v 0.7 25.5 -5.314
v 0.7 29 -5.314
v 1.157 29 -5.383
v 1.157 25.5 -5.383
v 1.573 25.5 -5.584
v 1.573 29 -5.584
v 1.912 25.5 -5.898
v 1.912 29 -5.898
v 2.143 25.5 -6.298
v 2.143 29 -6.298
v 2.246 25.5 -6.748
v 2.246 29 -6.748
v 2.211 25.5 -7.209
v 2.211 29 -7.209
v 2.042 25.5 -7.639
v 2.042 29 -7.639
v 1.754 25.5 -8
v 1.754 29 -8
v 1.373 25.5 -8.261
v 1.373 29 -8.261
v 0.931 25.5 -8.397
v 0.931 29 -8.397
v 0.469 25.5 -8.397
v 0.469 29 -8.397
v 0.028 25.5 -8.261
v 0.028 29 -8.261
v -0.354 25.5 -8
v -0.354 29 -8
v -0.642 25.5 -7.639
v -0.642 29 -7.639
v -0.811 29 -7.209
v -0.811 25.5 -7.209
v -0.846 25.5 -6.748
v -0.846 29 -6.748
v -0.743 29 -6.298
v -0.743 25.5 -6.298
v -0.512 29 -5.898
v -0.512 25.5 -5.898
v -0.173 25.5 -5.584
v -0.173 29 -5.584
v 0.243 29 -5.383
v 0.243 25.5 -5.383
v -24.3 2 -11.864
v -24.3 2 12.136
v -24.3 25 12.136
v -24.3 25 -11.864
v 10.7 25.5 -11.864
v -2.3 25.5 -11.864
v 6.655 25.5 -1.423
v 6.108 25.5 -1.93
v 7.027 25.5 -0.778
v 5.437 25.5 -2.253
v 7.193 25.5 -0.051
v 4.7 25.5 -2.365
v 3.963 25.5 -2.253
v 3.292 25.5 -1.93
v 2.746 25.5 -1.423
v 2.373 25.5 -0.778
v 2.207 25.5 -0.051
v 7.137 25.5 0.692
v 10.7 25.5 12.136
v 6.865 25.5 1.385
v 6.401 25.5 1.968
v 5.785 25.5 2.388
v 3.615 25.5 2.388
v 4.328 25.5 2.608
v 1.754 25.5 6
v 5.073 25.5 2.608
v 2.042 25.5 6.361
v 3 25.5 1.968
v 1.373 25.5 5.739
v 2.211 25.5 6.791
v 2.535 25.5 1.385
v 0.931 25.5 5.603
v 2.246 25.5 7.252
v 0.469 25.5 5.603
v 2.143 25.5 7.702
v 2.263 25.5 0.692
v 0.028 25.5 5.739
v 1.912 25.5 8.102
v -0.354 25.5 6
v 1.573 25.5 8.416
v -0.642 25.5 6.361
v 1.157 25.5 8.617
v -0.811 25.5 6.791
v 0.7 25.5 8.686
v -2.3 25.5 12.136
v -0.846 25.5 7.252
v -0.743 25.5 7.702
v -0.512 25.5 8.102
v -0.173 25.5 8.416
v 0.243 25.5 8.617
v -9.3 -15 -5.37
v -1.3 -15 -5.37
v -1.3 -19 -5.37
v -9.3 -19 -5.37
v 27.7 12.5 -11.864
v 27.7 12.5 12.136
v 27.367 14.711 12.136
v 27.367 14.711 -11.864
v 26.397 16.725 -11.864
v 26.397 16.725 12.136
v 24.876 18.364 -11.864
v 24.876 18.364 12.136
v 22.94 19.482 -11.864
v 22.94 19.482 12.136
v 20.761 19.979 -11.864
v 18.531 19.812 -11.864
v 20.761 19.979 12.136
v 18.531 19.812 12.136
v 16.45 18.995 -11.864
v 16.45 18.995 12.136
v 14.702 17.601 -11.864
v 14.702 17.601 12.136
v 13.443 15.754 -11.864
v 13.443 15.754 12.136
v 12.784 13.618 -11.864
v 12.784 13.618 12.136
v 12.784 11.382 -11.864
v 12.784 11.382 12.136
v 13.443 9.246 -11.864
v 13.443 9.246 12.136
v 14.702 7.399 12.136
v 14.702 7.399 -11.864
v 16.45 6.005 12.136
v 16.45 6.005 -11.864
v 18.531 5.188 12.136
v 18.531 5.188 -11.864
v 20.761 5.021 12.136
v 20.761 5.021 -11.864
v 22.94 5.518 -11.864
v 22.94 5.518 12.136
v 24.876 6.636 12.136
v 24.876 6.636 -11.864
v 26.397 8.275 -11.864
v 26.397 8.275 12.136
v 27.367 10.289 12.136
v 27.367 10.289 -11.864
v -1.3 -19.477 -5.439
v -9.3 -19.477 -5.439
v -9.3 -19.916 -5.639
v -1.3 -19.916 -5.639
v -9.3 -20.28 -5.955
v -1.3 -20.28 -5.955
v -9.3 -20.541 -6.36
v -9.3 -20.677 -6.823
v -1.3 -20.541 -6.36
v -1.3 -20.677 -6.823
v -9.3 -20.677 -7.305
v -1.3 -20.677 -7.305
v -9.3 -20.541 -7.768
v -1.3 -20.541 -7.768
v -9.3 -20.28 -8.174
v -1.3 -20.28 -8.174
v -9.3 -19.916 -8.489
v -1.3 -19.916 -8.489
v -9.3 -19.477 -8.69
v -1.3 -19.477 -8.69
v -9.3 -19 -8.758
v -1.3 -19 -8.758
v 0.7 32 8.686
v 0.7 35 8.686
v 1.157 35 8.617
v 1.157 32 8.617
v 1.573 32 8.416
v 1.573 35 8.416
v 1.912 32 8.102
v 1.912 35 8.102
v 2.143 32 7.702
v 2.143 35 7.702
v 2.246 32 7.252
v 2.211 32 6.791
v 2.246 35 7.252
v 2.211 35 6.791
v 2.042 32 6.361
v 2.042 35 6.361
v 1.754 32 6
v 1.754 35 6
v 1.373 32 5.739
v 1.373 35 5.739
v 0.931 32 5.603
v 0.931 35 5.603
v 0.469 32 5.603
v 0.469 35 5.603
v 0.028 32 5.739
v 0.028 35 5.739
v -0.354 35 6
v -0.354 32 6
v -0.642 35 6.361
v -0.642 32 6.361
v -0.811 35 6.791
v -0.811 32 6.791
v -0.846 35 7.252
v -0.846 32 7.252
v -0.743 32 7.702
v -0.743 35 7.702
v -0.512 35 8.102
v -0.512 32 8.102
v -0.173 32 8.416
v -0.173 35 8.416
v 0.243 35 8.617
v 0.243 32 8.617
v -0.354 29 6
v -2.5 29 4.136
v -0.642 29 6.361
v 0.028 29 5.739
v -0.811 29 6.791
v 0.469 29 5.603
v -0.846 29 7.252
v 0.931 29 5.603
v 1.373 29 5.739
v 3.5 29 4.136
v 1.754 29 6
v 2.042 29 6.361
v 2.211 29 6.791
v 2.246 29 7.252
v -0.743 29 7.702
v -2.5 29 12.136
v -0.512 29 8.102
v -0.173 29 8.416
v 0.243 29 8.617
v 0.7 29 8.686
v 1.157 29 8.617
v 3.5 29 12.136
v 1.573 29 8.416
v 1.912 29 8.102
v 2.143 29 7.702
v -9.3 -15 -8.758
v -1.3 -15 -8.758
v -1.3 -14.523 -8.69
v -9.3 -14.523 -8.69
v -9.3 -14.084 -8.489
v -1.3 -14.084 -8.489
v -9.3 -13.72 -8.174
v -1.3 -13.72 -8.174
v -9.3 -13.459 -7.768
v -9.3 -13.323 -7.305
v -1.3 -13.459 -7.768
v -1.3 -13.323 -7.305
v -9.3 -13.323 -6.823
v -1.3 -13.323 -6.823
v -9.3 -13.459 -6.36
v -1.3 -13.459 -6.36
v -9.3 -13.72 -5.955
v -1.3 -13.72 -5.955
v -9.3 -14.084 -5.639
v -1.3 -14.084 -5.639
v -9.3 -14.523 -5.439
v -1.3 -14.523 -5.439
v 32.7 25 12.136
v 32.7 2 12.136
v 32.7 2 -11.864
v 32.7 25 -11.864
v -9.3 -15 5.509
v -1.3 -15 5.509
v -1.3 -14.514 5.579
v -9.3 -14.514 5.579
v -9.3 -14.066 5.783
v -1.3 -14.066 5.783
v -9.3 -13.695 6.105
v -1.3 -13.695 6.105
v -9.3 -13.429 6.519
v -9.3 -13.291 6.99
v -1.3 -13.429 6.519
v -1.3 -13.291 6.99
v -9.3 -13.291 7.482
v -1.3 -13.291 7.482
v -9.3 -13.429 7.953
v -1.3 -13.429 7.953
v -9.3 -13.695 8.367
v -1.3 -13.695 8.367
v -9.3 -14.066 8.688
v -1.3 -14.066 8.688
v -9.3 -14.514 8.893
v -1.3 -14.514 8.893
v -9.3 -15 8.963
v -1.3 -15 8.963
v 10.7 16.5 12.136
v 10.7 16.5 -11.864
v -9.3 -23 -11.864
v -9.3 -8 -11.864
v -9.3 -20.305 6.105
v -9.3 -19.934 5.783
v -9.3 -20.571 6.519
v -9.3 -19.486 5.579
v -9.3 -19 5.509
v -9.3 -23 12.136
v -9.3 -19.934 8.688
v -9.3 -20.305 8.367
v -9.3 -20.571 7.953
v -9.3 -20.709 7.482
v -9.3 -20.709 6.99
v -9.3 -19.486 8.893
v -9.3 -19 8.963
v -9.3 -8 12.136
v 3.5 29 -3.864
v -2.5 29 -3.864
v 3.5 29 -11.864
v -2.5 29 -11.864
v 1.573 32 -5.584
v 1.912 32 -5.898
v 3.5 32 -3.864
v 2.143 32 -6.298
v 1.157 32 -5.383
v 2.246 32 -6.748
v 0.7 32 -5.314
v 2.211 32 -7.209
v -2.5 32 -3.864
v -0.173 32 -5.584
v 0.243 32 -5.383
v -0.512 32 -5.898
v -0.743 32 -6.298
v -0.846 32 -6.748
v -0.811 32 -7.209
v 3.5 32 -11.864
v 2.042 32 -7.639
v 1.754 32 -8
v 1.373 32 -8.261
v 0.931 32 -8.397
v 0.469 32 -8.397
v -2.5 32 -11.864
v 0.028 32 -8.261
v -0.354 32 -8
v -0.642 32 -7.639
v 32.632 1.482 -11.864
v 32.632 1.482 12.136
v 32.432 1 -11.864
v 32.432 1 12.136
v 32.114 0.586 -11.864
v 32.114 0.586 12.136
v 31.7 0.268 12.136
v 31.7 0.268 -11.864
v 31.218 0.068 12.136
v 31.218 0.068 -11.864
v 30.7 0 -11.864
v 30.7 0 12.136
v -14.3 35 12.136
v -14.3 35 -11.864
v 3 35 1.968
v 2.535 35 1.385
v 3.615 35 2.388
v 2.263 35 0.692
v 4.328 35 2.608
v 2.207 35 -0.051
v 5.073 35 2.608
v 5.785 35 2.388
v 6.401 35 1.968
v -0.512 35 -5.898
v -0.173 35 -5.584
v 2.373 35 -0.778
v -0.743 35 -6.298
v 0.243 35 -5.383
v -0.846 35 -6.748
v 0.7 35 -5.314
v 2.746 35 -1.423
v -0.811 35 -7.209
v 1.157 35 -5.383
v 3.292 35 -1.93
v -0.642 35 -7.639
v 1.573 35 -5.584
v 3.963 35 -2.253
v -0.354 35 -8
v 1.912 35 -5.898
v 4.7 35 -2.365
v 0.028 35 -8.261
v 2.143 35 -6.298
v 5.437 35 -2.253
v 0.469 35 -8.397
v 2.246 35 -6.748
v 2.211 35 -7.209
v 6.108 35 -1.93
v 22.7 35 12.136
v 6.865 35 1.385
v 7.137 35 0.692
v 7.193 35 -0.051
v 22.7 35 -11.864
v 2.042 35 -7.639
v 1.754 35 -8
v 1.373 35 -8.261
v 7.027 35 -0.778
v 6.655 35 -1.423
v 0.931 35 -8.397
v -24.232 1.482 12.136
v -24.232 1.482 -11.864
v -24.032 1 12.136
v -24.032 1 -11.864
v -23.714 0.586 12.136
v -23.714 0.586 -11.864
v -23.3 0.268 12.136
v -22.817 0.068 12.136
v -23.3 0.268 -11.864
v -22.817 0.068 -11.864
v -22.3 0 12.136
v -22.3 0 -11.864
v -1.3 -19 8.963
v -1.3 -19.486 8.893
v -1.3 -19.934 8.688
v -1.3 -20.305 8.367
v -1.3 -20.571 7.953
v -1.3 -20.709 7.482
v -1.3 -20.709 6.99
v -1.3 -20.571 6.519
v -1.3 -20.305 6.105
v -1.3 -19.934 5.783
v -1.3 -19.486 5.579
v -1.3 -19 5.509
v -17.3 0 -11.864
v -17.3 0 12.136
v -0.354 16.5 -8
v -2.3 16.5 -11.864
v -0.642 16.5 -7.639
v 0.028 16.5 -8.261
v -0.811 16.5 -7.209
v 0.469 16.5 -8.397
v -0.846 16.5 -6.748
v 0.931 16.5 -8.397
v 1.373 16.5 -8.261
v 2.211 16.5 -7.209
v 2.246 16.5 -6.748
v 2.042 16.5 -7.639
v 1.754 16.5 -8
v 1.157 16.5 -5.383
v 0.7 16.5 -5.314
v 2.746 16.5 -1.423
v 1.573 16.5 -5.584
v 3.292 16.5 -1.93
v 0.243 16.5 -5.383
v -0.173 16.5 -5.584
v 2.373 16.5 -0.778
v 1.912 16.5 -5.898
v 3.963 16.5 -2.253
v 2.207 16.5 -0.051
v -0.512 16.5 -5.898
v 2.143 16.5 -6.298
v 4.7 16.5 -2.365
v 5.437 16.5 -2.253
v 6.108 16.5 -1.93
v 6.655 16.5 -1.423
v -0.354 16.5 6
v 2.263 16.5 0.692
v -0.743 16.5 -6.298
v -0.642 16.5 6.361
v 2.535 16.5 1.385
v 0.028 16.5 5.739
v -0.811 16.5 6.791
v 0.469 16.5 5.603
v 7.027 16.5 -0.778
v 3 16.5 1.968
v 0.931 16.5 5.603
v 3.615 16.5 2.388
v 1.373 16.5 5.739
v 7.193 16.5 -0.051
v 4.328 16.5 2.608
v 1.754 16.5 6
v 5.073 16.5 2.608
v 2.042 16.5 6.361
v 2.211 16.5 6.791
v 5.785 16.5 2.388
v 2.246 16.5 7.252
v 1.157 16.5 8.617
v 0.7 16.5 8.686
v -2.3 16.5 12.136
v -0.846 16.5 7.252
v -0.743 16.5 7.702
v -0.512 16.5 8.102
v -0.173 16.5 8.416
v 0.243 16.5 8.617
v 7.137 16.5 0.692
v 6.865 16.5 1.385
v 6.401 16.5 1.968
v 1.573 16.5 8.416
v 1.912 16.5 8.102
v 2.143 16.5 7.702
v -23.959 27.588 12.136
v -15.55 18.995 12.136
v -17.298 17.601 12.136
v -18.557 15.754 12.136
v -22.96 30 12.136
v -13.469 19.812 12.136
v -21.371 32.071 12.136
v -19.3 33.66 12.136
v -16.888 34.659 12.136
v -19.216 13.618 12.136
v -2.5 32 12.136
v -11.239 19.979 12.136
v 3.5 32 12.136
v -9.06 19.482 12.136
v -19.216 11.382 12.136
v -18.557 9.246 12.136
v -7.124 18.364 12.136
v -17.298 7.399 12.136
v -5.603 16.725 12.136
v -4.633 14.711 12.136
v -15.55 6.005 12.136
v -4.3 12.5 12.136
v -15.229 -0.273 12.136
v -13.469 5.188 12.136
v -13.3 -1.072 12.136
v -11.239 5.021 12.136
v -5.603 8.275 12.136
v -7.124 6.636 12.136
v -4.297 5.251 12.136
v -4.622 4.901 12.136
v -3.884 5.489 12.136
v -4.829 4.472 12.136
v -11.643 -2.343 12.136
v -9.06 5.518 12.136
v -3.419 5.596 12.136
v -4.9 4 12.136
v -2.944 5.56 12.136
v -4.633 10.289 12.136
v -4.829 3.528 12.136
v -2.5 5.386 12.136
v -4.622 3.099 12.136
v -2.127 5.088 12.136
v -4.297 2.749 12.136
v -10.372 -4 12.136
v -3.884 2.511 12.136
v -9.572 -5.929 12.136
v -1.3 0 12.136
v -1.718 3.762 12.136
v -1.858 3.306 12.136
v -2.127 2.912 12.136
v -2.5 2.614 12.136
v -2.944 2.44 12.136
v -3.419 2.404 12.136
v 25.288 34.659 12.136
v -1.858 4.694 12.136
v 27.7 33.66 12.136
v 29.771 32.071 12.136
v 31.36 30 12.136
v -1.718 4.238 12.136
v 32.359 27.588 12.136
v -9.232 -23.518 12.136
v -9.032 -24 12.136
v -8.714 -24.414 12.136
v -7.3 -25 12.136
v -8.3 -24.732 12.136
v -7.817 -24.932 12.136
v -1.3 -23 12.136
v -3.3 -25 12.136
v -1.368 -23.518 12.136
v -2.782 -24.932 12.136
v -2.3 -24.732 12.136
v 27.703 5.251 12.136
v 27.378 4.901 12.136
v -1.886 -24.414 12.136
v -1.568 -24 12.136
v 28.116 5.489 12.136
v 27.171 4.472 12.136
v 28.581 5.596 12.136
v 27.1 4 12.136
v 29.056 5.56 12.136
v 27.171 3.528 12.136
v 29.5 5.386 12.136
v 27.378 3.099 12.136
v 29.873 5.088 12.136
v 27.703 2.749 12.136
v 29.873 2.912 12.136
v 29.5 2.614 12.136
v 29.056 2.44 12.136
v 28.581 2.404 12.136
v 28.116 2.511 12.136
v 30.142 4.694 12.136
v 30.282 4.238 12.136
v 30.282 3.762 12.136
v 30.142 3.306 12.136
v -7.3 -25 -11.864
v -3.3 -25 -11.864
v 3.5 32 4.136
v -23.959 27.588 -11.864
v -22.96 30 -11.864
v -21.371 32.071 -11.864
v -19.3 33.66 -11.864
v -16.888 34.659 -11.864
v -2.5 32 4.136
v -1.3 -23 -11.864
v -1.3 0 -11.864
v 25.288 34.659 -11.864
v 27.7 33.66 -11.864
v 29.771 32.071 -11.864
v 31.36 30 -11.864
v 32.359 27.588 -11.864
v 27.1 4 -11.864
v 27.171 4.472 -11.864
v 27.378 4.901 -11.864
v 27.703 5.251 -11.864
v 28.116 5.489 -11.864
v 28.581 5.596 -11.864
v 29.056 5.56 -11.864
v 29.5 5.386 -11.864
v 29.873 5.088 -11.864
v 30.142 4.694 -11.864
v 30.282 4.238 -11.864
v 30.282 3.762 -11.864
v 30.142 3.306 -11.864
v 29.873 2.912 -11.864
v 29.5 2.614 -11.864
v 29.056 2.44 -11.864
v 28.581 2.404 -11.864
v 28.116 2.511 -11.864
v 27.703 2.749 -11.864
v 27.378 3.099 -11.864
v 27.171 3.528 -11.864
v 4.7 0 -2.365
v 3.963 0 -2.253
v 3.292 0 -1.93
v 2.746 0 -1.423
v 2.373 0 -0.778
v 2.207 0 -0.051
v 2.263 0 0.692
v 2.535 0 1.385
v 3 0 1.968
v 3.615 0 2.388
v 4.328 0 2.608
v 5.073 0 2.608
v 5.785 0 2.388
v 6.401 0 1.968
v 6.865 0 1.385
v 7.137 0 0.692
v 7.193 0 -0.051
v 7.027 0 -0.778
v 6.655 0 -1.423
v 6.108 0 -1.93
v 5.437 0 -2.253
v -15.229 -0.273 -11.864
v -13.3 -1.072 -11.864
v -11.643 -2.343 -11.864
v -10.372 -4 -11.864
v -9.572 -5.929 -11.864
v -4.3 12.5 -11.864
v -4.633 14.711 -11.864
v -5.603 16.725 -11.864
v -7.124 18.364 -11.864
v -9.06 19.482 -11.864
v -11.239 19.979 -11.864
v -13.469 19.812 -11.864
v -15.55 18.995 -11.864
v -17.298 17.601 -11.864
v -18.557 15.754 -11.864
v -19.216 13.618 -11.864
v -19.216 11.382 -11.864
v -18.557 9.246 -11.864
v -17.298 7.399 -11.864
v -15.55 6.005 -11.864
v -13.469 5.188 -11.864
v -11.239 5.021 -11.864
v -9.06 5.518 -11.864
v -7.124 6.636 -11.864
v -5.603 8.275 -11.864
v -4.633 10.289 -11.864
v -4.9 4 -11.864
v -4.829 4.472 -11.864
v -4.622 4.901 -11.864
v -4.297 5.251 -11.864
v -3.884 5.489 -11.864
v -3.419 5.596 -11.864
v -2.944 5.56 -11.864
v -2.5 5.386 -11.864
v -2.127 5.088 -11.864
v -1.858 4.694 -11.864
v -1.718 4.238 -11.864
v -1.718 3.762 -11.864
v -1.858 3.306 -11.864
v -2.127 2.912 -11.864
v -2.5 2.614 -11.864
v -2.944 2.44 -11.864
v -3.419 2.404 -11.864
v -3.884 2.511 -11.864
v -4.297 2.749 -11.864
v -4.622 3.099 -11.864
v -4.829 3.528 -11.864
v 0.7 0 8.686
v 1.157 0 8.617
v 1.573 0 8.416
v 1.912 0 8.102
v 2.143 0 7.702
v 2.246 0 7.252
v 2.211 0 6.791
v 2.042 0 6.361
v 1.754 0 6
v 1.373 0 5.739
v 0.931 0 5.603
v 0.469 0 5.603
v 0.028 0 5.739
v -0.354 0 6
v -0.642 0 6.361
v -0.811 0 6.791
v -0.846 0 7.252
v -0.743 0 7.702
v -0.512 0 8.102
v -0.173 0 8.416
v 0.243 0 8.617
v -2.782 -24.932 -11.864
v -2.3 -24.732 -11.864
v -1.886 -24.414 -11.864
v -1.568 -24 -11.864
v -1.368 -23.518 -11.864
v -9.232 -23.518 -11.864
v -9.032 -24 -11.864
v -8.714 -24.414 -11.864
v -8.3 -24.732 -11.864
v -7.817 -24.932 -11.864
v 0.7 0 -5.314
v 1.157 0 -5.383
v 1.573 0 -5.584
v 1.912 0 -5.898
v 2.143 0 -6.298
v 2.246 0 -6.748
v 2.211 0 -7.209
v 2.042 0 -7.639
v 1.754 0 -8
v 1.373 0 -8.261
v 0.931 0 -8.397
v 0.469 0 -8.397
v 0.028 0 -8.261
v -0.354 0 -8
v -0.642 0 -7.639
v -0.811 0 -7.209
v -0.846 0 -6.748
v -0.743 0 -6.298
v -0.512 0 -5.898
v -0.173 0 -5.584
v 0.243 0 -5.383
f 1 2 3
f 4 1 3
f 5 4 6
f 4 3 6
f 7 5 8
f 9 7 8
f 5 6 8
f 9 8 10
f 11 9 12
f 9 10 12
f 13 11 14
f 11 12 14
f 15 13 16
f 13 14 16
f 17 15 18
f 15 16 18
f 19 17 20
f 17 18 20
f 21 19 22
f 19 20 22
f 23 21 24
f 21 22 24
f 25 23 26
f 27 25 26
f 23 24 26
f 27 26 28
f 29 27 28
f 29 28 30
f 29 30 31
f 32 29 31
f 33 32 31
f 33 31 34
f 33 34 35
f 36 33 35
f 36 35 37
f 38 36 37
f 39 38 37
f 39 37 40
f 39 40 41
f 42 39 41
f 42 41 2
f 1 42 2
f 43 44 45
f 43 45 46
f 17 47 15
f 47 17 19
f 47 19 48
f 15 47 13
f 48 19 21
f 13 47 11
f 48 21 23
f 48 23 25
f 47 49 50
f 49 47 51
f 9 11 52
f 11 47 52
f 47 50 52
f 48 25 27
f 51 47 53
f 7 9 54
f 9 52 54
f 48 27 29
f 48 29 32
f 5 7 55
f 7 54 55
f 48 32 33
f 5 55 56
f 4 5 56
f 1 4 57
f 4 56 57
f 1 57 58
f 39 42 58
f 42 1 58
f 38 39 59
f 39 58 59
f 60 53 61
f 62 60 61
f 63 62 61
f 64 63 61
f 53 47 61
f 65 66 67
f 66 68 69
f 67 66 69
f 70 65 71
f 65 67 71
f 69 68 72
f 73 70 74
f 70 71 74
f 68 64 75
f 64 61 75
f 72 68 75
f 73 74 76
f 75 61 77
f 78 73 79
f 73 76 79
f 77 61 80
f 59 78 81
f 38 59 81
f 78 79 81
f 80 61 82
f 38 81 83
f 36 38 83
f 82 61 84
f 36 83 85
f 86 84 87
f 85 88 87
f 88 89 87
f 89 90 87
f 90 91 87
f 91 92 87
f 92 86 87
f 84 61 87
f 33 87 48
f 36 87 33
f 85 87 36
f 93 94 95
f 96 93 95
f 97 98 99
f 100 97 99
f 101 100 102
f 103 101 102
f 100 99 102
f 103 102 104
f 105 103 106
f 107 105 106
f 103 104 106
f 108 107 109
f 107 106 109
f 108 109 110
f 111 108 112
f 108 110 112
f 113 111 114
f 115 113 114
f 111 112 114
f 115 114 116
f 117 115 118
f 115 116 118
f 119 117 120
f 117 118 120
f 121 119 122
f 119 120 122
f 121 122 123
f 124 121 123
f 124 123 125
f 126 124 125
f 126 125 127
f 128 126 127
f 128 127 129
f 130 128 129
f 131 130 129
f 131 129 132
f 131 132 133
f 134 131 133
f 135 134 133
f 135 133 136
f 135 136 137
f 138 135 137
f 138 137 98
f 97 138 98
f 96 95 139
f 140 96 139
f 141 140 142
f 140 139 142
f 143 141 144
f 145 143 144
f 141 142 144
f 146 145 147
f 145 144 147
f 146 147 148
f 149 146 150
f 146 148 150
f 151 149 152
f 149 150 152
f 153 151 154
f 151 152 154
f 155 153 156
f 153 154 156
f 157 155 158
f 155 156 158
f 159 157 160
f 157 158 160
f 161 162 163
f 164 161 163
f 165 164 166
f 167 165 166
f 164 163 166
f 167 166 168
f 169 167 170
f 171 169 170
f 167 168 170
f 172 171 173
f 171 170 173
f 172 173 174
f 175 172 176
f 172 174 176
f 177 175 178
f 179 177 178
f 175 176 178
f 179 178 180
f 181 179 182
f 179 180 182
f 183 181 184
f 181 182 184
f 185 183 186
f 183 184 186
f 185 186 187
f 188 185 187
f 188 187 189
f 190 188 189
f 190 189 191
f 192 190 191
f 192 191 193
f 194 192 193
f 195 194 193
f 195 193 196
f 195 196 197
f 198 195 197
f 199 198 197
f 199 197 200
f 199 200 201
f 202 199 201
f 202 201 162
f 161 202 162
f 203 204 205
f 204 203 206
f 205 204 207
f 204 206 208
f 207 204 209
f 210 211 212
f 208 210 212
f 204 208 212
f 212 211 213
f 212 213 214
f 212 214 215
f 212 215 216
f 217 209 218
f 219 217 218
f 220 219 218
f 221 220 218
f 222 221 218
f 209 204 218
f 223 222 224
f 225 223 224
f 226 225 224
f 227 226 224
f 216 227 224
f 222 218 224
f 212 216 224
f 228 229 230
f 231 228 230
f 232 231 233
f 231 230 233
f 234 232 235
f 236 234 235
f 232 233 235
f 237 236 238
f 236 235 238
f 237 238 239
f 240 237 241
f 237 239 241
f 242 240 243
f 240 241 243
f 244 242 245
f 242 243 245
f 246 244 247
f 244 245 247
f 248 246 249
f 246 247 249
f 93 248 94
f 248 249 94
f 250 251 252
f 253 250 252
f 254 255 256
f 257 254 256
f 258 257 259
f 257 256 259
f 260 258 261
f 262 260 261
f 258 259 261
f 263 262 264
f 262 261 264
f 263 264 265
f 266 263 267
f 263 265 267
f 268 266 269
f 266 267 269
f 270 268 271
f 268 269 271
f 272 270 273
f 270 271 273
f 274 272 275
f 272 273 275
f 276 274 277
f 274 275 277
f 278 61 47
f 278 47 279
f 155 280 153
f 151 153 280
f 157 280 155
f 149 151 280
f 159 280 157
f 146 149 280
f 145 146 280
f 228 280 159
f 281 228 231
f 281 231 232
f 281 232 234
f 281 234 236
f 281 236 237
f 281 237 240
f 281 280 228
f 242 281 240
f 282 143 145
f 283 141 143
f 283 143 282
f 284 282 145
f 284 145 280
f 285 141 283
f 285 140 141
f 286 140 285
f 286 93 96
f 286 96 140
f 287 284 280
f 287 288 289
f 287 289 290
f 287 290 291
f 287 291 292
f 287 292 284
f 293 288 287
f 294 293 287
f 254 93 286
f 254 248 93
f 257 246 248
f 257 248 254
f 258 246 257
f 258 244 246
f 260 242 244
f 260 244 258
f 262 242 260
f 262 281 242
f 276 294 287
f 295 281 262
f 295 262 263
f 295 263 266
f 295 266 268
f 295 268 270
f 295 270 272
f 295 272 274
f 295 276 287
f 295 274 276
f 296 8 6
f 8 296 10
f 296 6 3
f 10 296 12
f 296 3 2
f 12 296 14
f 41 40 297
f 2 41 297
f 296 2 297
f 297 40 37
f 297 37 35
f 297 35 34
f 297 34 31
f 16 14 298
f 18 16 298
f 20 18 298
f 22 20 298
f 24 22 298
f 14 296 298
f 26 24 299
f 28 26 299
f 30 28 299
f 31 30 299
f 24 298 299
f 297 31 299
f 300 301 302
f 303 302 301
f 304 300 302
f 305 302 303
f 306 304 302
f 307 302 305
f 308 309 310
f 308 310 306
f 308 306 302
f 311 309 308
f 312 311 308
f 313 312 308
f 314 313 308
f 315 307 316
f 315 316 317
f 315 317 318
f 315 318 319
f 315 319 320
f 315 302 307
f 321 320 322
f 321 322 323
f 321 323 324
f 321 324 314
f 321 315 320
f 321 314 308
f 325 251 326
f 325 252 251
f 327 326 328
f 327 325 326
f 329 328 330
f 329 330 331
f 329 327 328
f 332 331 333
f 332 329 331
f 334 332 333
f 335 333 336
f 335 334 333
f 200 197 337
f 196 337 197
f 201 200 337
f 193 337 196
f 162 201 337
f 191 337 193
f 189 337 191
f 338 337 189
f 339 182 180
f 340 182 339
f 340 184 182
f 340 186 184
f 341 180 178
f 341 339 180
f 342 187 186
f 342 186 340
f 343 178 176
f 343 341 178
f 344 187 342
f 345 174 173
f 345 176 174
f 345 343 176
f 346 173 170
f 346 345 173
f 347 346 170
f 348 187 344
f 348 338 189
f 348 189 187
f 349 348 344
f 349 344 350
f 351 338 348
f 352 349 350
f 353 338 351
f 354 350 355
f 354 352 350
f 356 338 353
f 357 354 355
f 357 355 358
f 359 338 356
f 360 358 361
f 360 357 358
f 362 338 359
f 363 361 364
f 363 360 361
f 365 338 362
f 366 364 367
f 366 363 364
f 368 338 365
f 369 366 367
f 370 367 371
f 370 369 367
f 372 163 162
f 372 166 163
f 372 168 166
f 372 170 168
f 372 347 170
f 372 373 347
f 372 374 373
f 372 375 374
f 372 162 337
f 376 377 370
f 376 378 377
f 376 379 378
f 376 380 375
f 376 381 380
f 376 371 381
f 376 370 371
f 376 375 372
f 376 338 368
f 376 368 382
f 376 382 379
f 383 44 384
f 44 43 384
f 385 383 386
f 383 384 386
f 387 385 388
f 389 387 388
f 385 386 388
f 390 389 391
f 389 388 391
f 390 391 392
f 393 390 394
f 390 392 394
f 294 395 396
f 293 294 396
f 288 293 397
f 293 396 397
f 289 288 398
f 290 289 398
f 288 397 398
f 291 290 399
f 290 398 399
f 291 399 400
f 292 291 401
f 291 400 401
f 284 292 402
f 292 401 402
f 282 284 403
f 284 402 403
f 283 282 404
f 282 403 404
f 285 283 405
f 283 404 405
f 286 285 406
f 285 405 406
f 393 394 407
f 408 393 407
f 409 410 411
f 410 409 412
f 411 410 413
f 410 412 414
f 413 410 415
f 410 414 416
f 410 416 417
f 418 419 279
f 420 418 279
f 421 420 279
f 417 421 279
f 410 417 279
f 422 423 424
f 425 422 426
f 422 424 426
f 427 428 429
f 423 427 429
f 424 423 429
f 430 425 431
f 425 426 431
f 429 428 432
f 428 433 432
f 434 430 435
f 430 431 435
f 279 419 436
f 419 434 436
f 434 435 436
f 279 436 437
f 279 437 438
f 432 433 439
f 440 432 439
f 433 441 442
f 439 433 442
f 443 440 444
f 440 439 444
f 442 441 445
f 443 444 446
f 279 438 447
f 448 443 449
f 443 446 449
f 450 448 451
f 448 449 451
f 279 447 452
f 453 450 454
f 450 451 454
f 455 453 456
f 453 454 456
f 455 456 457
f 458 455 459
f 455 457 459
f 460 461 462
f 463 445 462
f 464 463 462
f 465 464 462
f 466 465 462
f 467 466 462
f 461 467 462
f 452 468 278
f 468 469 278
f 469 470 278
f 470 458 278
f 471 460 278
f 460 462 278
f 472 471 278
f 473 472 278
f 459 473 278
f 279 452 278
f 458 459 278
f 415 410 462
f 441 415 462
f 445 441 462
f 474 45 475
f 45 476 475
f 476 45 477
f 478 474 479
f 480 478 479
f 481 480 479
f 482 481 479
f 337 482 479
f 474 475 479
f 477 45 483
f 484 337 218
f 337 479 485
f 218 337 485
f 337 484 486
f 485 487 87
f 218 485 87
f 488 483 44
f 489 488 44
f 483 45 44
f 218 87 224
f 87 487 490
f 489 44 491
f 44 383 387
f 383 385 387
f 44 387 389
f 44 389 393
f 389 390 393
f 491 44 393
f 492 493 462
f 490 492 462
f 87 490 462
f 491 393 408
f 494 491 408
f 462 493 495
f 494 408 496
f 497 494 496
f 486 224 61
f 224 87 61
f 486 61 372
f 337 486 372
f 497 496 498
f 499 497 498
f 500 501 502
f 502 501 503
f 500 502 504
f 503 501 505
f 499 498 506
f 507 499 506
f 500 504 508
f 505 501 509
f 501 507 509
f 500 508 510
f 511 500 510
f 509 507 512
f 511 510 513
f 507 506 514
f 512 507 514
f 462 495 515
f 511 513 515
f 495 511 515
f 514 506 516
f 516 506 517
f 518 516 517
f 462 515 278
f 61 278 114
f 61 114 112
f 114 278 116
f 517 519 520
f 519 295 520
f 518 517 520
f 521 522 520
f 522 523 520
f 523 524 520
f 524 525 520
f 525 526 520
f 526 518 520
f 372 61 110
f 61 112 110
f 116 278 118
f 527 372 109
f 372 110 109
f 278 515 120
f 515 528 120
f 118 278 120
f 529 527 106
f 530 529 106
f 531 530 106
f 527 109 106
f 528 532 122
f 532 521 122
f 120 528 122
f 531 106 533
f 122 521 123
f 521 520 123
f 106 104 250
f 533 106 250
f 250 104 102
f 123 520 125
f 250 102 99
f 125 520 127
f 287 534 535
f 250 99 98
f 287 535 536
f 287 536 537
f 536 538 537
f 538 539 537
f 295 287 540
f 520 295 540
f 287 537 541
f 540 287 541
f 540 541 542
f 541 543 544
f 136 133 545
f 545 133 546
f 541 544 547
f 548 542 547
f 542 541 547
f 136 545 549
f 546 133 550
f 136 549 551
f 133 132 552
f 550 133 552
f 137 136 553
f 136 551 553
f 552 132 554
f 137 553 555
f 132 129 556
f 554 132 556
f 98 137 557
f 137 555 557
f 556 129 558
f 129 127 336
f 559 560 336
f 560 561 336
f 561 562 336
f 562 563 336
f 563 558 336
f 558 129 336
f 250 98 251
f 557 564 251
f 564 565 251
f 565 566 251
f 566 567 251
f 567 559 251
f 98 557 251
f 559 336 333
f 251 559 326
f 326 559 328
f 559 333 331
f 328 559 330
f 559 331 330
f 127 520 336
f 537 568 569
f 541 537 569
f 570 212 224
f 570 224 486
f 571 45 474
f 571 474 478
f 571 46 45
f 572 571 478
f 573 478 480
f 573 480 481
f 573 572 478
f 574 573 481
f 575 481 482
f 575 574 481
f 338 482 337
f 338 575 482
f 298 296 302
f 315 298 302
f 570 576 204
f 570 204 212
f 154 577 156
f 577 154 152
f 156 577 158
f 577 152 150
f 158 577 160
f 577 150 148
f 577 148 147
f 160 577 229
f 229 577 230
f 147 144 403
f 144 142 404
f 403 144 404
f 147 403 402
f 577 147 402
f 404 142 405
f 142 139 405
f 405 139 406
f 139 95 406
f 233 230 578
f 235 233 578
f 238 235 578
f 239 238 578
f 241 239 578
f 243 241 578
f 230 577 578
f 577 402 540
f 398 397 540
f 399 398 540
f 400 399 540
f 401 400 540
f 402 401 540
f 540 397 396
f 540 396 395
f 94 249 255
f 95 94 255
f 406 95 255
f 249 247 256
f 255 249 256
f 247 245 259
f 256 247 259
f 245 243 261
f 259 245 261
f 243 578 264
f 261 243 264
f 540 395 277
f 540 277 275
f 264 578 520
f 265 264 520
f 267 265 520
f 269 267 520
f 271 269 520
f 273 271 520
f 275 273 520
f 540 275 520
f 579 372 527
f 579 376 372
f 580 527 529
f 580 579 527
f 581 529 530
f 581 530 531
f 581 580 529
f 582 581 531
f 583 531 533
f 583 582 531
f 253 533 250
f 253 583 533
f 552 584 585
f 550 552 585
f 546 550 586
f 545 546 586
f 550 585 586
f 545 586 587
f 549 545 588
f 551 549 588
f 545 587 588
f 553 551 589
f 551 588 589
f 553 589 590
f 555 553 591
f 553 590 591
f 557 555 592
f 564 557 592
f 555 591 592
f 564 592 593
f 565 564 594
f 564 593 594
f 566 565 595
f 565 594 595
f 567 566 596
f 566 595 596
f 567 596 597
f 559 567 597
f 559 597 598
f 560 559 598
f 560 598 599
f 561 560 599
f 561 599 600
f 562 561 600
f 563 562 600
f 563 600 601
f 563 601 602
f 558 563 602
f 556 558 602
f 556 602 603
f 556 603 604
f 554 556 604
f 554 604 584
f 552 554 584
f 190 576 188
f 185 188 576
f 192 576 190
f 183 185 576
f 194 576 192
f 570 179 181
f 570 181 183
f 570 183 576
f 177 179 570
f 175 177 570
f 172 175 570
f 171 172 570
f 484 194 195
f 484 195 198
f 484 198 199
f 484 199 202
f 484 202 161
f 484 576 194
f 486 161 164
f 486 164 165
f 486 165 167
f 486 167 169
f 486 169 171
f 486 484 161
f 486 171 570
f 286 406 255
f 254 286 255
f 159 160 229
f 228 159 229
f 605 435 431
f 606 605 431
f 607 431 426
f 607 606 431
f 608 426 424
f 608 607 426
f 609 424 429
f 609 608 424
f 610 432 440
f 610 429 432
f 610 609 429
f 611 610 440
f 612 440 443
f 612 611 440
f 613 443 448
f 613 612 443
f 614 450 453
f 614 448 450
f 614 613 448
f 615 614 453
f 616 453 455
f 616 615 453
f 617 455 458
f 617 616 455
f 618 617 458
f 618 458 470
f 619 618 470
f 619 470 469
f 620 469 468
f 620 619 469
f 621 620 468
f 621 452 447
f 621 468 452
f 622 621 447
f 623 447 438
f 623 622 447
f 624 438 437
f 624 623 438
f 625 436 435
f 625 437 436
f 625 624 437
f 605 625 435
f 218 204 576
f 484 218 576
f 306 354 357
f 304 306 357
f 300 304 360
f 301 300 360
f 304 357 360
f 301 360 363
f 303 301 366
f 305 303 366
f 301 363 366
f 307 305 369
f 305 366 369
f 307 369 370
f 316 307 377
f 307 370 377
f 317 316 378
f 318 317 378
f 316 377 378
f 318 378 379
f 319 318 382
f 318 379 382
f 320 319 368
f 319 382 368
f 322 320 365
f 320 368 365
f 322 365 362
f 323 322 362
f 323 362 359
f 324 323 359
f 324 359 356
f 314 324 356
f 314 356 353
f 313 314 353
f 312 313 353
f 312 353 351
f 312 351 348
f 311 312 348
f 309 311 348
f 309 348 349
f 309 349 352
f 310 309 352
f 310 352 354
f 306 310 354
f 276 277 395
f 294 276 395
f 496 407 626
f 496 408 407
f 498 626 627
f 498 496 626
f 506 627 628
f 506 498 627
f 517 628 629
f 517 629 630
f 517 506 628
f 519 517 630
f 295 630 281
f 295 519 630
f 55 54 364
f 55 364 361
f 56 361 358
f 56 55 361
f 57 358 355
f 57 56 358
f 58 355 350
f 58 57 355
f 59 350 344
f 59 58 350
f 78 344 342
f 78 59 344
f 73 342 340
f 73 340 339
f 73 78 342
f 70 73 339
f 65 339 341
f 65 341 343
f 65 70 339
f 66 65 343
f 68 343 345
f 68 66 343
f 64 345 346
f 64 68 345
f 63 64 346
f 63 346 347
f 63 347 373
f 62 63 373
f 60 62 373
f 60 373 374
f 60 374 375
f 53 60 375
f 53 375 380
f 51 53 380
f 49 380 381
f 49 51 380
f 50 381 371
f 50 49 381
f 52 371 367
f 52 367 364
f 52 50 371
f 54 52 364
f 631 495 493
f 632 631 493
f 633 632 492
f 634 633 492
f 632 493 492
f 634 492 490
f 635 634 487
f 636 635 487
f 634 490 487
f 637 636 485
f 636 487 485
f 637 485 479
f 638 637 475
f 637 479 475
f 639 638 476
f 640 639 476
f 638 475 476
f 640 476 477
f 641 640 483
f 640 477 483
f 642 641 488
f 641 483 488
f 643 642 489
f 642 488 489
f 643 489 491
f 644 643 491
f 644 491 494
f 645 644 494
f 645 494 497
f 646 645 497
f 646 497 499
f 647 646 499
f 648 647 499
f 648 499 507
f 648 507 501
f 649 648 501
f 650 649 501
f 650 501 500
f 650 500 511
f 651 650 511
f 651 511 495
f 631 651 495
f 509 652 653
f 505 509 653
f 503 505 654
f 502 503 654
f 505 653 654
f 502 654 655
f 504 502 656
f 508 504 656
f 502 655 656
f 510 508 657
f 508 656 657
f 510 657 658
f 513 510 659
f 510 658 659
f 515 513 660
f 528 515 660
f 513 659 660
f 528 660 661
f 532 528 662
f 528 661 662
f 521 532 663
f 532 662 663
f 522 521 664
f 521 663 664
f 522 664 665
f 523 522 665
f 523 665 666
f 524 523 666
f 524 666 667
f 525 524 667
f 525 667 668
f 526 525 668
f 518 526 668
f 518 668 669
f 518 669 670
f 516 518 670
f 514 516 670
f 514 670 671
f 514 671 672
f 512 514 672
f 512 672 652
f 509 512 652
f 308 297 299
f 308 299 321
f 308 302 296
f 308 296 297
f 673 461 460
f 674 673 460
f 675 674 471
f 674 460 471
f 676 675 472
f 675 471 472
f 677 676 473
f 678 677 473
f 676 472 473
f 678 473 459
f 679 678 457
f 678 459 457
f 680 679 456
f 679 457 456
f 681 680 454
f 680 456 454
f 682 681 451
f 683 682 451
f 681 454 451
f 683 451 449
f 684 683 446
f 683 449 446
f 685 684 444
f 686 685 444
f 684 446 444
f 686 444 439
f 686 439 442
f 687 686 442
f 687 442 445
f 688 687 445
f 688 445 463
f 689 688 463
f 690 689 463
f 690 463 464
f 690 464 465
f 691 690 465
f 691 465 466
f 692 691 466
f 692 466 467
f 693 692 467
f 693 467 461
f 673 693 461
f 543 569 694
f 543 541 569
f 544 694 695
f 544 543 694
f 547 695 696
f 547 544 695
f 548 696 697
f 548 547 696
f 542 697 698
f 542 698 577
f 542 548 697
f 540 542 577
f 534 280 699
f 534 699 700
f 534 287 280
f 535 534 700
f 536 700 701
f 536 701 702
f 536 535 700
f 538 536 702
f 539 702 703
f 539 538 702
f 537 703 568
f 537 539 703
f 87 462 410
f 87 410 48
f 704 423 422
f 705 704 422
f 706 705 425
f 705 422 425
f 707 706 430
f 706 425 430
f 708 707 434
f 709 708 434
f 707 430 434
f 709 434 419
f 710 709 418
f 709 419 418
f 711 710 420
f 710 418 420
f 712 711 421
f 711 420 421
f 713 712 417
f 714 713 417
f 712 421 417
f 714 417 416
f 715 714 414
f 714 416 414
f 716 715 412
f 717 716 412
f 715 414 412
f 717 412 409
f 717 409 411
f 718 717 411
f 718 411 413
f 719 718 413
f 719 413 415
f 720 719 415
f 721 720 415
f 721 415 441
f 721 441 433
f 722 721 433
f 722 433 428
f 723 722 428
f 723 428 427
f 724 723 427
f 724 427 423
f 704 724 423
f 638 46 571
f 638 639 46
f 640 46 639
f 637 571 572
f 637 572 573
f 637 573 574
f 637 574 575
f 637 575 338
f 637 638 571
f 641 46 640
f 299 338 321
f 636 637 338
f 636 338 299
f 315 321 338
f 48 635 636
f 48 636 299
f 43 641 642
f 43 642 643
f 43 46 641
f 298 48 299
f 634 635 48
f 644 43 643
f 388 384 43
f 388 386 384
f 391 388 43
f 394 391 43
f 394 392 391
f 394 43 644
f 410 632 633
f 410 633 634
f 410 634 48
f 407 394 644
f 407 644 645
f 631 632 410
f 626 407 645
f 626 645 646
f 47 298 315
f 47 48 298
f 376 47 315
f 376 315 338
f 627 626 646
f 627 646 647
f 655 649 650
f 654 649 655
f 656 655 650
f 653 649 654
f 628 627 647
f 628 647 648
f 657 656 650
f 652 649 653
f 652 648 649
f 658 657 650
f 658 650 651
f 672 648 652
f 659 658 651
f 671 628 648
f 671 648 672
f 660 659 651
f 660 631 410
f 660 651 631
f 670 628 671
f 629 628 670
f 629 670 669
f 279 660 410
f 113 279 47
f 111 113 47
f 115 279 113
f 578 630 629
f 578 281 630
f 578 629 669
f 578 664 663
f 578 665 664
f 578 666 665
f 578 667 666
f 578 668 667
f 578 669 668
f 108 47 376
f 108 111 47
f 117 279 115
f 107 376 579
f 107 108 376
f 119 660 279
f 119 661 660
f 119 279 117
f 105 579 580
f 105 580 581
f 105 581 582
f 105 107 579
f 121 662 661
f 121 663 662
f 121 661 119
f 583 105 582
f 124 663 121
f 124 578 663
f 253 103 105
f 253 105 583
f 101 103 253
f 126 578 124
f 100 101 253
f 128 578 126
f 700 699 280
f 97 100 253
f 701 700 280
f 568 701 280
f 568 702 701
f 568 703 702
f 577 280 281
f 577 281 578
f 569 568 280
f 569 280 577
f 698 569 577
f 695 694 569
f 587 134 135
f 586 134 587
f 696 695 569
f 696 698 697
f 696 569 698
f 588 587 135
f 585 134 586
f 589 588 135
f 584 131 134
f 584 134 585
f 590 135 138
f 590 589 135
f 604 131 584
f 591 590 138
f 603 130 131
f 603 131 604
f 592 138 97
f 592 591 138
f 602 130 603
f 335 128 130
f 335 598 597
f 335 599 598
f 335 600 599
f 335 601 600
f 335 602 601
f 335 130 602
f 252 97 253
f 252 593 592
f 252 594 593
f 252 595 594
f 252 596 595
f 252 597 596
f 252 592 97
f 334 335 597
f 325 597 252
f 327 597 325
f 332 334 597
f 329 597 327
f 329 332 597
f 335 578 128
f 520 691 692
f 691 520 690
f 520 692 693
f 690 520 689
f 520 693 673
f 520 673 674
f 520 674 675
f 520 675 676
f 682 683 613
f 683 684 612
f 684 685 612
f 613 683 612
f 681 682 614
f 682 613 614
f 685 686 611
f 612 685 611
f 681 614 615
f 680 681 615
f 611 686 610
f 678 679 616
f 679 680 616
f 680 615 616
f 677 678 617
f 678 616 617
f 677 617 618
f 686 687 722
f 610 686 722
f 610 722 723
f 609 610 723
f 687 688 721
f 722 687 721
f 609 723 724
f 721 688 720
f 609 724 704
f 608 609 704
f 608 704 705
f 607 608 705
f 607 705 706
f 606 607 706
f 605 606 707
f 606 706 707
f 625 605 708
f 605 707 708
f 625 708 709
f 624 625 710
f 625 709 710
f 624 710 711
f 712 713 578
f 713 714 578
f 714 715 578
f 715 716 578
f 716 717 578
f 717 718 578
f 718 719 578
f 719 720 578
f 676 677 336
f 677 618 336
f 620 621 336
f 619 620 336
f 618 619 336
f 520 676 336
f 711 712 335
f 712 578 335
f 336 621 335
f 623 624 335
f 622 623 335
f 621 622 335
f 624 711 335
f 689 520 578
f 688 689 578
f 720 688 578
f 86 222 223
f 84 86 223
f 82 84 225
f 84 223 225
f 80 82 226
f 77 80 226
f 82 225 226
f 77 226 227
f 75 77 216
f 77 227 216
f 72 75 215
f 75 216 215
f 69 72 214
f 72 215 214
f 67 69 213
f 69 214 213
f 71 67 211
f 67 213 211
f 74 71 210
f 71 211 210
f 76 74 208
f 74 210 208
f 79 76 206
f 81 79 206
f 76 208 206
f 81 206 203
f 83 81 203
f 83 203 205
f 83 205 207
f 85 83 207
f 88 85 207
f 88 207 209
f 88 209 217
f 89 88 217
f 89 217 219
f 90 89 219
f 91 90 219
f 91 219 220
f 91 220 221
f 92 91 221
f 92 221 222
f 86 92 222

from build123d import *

# Parameters (mm, degrees)
SKETCH_1_W               = 57
SKETCH_1_H               = 24
EXTRUDE_1_DEPTH          = 25
SKETCH_2_R               = 7.5
CUT_EXTRUDE_1_DEPTH      = 48.647668573
SKETCH_3_W               = 8
SKETCH_3_H               = 24
EXTRUDE_2_DEPTH          = 25
CUT_EXTRUDE_2_DEPTH      = 51.361473246
CUT_EXTRUDE_2_DEPTH_BACK = 51.361473246
SKETCH_5_R               = 2.5
CUT_EXTRUDE_3_DEPTH      = 43.913614482
FILLET_1_R               = 8
SKETCH_6_W               = 57
SKETCH_6_H               = 24
SKETCH_6_R               = 2.5
EXTRUDE_3_DEPTH          = 10
CUT_EXTRUDE_4_DEPTH      = 54.575183811
SKETCH_8_R               = 1.55
CUT_EXTRUDE_5_DEPTH      = 70.401572806
SKETCH_9_W               = 6
SKETCH_9_H               = 3
CUT_EXTRUDE_6_DEPTH      = 8
SKETCH_10_W              = 6
SKETCH_10_H              = 3
CUT_EXTRUDE_7_DEPTH      = 8
SKETCH_11_R              = 1.6
CUT_EXTRUDE_8_DEPTH      = 54.575183811
FILLET_2_R               = 10
FILLET_3_R               = 2
FILLET_4_R               = 2


with BuildPart() as part:
    # 草图1 → 凸台-拉伸1 (new body)
    with BuildSketch(Plane(origin=(0, 0, 0), x_dir=(1, 0, 0), z_dir=(0, 1, 0))):
        with Locations((4.200157804, -0.135814249)):
            Rectangle(SKETCH_1_W, SKETCH_1_H)
    extrude(amount=EXTRUDE_1_DEPTH)

    # 草图2 → 切除-拉伸1 (cut, through all)
    with BuildSketch(Plane.XY.offset(12.135814249)):
        with Locations((-11.799842196, 12.5)):
            Circle(SKETCH_2_R)
        with Locations((20.200157804, 12.5)):
            Circle(SKETCH_2_R)
    extrude(amount=-CUT_EXTRUDE_1_DEPTH, mode=Mode.SUBTRACT)

    # 草图3 → 凸台-拉伸2 (add)
    with BuildSketch(Plane.XZ):
        with Locations((-5.299842196, 0.135814249)):
            Rectangle(SKETCH_3_W, SKETCH_3_H)
    extrude(amount=EXTRUDE_2_DEPTH)

    # 草图4 → 切除-拉伸2 (cut, two sides: drawn at the far end of the back side and taken through both)
    with BuildSketch(Plane.ZY.offset(9.299842196).offset(-CUT_EXTRUDE_2_DEPTH_BACK)):
        with BuildLine():
            Line((-8.758359631, -19), (-8.758359631, -15))
            ThreePointArc((-8.758359631, -15), (-7.064185751, -13.30582612), (-5.370011871, -15))
            Line((-5.370011871, -15), (-5.370011871, -19))
            ThreePointArc((-5.370011871, -19), (-7.064185751, -20.69417388), (-8.758359631, -19))
        make_face()
        with BuildLine():
            Line((5.509094538, -19), (5.509094538, -15))
            ThreePointArc((5.509094538, -15), (7.235814249, -13.273280289), (8.96253396, -15))
            Line((8.96253396, -15), (8.96253396, -19))
            ThreePointArc((8.96253396, -19), (7.235814249, -20.726719711), (5.509094538, -19))
        make_face()
    extrude(amount=CUT_EXTRUDE_2_DEPTH + CUT_EXTRUDE_2_DEPTH_BACK, mode=Mode.SUBTRACT)

    # 草图5 → 切除-拉伸3 (cut, through all)
    with BuildSketch(Plane.XZ):
        with Locations(Location((4.700157804, 0.135451208, 0), (0, 0, 270))):
            Circle(SKETCH_5_R)
    extrude(amount=-CUT_EXTRUDE_3_DEPTH, mode=Mode.SUBTRACT)

    # 圆角1
    fillet_1_edges = [part.edges().sort_by_distance(p)[0] for p in [
        (-9.299842196, 0, 0.135814249),
    ]]
    fillet(fillet_1_edges, radius=FILLET_1_R)

    # 草图6 → 凸台-拉伸3 (add)
    with BuildSketch(Plane(origin=(0, 25, 0), x_dir=(1, 0, 0), z_dir=(0, 1, 0))):
        with Locations((4.200157804, -0.135814249)):
            Rectangle(SKETCH_6_W, SKETCH_6_H)
        with Locations(Location((4.700157804, -0.135451208, 0), (0, 0, 90))):
            Circle(SKETCH_6_R, mode=Mode.SUBTRACT)
    extrude(amount=EXTRUDE_3_DEPTH)

    # 草图7 → 切除-拉伸4 (cut, through all)
    with BuildSketch(Plane.XY.offset(12.135814249)):
        Polygon((-2.299842196, 25.5), (2.700157804, 25.5), (5.700157804, 25.5), (10.700157804, 25.5), (10.700157804, 16.5), (5.700157804, 16.5), (2.700157804, 16.5), (-2.299842196, 16.5), align=None)
    extrude(amount=-CUT_EXTRUDE_4_DEPTH, mode=Mode.SUBTRACT)

    # 草图8 → 切除-拉伸5 (cut, through all)
    with BuildSketch(Plane(origin=(0, 35, 0), x_dir=(1, 0, 0), z_dir=(0, 1, 0))):
        with Locations(Location((0.700157804, -7.135814249, 0), (0, 0, 270))):
            Circle(SKETCH_8_R)
        with Locations(Location((0.700157804, 6.864185751, 0), (0, 0, 270))):
            Circle(SKETCH_8_R)
    extrude(amount=-CUT_EXTRUDE_5_DEPTH, mode=Mode.SUBTRACT)

    # 草图9 → 切除-拉伸6 (cut)
    with BuildSketch(Plane.XY.offset(12.135814249)):
        with Locations((0.500157804, 30.5)):
            Rectangle(SKETCH_9_W, SKETCH_9_H)
    extrude(amount=-CUT_EXTRUDE_6_DEPTH, mode=Mode.SUBTRACT)

    # 草图10 → 切除-拉伸7 (cut)
    with BuildSketch(Plane(origin=(0, 0, -11.864185751), x_dir=(-1, 0, 0), z_dir=(0, 0, -1))):
        with Locations((-0.500157804, 30.5)):
            Rectangle(SKETCH_10_W, SKETCH_10_H)
    extrude(amount=-CUT_EXTRUDE_7_DEPTH, mode=Mode.SUBTRACT)

    # 草图11 → 切除-拉伸8 (cut, through all)
    with BuildSketch(Plane(origin=(0, 0, -11.864185751), x_dir=(-1, 0, 0), z_dir=(0, 0, -1))):
        with Locations((-28.700157804, 4)):
            Circle(SKETCH_11_R)
        with Locations((3.299842196, 4)):
            Circle(SKETCH_11_R)
    extrude(amount=-CUT_EXTRUDE_8_DEPTH, mode=Mode.SUBTRACT)

    # 圆角2
    fillet_2_edges = [part.edges().sort_by_distance(p)[0] for p in [
        (-24.299842196, 35, 0.135814249),
        (32.700157804, 35, 0.135814249),
    ]]
    fillet(fillet_2_edges, radius=FILLET_2_R)

    # 圆角3
    fillet_3_edges = [part.edges().sort_by_distance(p)[0] for p in [
        (32.700157804, 0, 0.135814249),
        (-24.299842196, 0, 0.135814249),
    ]]
    fillet(fillet_3_edges, radius=FILLET_3_R)

    # 圆角4
    fillet_4_edges = [part.edges().sort_by_distance(p)[0] for p in [
        (-9.299842196, -25, 0.135814249),
        (-1.299842196, -25, 0.135814249),
    ]]
    fillet(fillet_4_edges, radius=FILLET_4_R)


solid = part.part
